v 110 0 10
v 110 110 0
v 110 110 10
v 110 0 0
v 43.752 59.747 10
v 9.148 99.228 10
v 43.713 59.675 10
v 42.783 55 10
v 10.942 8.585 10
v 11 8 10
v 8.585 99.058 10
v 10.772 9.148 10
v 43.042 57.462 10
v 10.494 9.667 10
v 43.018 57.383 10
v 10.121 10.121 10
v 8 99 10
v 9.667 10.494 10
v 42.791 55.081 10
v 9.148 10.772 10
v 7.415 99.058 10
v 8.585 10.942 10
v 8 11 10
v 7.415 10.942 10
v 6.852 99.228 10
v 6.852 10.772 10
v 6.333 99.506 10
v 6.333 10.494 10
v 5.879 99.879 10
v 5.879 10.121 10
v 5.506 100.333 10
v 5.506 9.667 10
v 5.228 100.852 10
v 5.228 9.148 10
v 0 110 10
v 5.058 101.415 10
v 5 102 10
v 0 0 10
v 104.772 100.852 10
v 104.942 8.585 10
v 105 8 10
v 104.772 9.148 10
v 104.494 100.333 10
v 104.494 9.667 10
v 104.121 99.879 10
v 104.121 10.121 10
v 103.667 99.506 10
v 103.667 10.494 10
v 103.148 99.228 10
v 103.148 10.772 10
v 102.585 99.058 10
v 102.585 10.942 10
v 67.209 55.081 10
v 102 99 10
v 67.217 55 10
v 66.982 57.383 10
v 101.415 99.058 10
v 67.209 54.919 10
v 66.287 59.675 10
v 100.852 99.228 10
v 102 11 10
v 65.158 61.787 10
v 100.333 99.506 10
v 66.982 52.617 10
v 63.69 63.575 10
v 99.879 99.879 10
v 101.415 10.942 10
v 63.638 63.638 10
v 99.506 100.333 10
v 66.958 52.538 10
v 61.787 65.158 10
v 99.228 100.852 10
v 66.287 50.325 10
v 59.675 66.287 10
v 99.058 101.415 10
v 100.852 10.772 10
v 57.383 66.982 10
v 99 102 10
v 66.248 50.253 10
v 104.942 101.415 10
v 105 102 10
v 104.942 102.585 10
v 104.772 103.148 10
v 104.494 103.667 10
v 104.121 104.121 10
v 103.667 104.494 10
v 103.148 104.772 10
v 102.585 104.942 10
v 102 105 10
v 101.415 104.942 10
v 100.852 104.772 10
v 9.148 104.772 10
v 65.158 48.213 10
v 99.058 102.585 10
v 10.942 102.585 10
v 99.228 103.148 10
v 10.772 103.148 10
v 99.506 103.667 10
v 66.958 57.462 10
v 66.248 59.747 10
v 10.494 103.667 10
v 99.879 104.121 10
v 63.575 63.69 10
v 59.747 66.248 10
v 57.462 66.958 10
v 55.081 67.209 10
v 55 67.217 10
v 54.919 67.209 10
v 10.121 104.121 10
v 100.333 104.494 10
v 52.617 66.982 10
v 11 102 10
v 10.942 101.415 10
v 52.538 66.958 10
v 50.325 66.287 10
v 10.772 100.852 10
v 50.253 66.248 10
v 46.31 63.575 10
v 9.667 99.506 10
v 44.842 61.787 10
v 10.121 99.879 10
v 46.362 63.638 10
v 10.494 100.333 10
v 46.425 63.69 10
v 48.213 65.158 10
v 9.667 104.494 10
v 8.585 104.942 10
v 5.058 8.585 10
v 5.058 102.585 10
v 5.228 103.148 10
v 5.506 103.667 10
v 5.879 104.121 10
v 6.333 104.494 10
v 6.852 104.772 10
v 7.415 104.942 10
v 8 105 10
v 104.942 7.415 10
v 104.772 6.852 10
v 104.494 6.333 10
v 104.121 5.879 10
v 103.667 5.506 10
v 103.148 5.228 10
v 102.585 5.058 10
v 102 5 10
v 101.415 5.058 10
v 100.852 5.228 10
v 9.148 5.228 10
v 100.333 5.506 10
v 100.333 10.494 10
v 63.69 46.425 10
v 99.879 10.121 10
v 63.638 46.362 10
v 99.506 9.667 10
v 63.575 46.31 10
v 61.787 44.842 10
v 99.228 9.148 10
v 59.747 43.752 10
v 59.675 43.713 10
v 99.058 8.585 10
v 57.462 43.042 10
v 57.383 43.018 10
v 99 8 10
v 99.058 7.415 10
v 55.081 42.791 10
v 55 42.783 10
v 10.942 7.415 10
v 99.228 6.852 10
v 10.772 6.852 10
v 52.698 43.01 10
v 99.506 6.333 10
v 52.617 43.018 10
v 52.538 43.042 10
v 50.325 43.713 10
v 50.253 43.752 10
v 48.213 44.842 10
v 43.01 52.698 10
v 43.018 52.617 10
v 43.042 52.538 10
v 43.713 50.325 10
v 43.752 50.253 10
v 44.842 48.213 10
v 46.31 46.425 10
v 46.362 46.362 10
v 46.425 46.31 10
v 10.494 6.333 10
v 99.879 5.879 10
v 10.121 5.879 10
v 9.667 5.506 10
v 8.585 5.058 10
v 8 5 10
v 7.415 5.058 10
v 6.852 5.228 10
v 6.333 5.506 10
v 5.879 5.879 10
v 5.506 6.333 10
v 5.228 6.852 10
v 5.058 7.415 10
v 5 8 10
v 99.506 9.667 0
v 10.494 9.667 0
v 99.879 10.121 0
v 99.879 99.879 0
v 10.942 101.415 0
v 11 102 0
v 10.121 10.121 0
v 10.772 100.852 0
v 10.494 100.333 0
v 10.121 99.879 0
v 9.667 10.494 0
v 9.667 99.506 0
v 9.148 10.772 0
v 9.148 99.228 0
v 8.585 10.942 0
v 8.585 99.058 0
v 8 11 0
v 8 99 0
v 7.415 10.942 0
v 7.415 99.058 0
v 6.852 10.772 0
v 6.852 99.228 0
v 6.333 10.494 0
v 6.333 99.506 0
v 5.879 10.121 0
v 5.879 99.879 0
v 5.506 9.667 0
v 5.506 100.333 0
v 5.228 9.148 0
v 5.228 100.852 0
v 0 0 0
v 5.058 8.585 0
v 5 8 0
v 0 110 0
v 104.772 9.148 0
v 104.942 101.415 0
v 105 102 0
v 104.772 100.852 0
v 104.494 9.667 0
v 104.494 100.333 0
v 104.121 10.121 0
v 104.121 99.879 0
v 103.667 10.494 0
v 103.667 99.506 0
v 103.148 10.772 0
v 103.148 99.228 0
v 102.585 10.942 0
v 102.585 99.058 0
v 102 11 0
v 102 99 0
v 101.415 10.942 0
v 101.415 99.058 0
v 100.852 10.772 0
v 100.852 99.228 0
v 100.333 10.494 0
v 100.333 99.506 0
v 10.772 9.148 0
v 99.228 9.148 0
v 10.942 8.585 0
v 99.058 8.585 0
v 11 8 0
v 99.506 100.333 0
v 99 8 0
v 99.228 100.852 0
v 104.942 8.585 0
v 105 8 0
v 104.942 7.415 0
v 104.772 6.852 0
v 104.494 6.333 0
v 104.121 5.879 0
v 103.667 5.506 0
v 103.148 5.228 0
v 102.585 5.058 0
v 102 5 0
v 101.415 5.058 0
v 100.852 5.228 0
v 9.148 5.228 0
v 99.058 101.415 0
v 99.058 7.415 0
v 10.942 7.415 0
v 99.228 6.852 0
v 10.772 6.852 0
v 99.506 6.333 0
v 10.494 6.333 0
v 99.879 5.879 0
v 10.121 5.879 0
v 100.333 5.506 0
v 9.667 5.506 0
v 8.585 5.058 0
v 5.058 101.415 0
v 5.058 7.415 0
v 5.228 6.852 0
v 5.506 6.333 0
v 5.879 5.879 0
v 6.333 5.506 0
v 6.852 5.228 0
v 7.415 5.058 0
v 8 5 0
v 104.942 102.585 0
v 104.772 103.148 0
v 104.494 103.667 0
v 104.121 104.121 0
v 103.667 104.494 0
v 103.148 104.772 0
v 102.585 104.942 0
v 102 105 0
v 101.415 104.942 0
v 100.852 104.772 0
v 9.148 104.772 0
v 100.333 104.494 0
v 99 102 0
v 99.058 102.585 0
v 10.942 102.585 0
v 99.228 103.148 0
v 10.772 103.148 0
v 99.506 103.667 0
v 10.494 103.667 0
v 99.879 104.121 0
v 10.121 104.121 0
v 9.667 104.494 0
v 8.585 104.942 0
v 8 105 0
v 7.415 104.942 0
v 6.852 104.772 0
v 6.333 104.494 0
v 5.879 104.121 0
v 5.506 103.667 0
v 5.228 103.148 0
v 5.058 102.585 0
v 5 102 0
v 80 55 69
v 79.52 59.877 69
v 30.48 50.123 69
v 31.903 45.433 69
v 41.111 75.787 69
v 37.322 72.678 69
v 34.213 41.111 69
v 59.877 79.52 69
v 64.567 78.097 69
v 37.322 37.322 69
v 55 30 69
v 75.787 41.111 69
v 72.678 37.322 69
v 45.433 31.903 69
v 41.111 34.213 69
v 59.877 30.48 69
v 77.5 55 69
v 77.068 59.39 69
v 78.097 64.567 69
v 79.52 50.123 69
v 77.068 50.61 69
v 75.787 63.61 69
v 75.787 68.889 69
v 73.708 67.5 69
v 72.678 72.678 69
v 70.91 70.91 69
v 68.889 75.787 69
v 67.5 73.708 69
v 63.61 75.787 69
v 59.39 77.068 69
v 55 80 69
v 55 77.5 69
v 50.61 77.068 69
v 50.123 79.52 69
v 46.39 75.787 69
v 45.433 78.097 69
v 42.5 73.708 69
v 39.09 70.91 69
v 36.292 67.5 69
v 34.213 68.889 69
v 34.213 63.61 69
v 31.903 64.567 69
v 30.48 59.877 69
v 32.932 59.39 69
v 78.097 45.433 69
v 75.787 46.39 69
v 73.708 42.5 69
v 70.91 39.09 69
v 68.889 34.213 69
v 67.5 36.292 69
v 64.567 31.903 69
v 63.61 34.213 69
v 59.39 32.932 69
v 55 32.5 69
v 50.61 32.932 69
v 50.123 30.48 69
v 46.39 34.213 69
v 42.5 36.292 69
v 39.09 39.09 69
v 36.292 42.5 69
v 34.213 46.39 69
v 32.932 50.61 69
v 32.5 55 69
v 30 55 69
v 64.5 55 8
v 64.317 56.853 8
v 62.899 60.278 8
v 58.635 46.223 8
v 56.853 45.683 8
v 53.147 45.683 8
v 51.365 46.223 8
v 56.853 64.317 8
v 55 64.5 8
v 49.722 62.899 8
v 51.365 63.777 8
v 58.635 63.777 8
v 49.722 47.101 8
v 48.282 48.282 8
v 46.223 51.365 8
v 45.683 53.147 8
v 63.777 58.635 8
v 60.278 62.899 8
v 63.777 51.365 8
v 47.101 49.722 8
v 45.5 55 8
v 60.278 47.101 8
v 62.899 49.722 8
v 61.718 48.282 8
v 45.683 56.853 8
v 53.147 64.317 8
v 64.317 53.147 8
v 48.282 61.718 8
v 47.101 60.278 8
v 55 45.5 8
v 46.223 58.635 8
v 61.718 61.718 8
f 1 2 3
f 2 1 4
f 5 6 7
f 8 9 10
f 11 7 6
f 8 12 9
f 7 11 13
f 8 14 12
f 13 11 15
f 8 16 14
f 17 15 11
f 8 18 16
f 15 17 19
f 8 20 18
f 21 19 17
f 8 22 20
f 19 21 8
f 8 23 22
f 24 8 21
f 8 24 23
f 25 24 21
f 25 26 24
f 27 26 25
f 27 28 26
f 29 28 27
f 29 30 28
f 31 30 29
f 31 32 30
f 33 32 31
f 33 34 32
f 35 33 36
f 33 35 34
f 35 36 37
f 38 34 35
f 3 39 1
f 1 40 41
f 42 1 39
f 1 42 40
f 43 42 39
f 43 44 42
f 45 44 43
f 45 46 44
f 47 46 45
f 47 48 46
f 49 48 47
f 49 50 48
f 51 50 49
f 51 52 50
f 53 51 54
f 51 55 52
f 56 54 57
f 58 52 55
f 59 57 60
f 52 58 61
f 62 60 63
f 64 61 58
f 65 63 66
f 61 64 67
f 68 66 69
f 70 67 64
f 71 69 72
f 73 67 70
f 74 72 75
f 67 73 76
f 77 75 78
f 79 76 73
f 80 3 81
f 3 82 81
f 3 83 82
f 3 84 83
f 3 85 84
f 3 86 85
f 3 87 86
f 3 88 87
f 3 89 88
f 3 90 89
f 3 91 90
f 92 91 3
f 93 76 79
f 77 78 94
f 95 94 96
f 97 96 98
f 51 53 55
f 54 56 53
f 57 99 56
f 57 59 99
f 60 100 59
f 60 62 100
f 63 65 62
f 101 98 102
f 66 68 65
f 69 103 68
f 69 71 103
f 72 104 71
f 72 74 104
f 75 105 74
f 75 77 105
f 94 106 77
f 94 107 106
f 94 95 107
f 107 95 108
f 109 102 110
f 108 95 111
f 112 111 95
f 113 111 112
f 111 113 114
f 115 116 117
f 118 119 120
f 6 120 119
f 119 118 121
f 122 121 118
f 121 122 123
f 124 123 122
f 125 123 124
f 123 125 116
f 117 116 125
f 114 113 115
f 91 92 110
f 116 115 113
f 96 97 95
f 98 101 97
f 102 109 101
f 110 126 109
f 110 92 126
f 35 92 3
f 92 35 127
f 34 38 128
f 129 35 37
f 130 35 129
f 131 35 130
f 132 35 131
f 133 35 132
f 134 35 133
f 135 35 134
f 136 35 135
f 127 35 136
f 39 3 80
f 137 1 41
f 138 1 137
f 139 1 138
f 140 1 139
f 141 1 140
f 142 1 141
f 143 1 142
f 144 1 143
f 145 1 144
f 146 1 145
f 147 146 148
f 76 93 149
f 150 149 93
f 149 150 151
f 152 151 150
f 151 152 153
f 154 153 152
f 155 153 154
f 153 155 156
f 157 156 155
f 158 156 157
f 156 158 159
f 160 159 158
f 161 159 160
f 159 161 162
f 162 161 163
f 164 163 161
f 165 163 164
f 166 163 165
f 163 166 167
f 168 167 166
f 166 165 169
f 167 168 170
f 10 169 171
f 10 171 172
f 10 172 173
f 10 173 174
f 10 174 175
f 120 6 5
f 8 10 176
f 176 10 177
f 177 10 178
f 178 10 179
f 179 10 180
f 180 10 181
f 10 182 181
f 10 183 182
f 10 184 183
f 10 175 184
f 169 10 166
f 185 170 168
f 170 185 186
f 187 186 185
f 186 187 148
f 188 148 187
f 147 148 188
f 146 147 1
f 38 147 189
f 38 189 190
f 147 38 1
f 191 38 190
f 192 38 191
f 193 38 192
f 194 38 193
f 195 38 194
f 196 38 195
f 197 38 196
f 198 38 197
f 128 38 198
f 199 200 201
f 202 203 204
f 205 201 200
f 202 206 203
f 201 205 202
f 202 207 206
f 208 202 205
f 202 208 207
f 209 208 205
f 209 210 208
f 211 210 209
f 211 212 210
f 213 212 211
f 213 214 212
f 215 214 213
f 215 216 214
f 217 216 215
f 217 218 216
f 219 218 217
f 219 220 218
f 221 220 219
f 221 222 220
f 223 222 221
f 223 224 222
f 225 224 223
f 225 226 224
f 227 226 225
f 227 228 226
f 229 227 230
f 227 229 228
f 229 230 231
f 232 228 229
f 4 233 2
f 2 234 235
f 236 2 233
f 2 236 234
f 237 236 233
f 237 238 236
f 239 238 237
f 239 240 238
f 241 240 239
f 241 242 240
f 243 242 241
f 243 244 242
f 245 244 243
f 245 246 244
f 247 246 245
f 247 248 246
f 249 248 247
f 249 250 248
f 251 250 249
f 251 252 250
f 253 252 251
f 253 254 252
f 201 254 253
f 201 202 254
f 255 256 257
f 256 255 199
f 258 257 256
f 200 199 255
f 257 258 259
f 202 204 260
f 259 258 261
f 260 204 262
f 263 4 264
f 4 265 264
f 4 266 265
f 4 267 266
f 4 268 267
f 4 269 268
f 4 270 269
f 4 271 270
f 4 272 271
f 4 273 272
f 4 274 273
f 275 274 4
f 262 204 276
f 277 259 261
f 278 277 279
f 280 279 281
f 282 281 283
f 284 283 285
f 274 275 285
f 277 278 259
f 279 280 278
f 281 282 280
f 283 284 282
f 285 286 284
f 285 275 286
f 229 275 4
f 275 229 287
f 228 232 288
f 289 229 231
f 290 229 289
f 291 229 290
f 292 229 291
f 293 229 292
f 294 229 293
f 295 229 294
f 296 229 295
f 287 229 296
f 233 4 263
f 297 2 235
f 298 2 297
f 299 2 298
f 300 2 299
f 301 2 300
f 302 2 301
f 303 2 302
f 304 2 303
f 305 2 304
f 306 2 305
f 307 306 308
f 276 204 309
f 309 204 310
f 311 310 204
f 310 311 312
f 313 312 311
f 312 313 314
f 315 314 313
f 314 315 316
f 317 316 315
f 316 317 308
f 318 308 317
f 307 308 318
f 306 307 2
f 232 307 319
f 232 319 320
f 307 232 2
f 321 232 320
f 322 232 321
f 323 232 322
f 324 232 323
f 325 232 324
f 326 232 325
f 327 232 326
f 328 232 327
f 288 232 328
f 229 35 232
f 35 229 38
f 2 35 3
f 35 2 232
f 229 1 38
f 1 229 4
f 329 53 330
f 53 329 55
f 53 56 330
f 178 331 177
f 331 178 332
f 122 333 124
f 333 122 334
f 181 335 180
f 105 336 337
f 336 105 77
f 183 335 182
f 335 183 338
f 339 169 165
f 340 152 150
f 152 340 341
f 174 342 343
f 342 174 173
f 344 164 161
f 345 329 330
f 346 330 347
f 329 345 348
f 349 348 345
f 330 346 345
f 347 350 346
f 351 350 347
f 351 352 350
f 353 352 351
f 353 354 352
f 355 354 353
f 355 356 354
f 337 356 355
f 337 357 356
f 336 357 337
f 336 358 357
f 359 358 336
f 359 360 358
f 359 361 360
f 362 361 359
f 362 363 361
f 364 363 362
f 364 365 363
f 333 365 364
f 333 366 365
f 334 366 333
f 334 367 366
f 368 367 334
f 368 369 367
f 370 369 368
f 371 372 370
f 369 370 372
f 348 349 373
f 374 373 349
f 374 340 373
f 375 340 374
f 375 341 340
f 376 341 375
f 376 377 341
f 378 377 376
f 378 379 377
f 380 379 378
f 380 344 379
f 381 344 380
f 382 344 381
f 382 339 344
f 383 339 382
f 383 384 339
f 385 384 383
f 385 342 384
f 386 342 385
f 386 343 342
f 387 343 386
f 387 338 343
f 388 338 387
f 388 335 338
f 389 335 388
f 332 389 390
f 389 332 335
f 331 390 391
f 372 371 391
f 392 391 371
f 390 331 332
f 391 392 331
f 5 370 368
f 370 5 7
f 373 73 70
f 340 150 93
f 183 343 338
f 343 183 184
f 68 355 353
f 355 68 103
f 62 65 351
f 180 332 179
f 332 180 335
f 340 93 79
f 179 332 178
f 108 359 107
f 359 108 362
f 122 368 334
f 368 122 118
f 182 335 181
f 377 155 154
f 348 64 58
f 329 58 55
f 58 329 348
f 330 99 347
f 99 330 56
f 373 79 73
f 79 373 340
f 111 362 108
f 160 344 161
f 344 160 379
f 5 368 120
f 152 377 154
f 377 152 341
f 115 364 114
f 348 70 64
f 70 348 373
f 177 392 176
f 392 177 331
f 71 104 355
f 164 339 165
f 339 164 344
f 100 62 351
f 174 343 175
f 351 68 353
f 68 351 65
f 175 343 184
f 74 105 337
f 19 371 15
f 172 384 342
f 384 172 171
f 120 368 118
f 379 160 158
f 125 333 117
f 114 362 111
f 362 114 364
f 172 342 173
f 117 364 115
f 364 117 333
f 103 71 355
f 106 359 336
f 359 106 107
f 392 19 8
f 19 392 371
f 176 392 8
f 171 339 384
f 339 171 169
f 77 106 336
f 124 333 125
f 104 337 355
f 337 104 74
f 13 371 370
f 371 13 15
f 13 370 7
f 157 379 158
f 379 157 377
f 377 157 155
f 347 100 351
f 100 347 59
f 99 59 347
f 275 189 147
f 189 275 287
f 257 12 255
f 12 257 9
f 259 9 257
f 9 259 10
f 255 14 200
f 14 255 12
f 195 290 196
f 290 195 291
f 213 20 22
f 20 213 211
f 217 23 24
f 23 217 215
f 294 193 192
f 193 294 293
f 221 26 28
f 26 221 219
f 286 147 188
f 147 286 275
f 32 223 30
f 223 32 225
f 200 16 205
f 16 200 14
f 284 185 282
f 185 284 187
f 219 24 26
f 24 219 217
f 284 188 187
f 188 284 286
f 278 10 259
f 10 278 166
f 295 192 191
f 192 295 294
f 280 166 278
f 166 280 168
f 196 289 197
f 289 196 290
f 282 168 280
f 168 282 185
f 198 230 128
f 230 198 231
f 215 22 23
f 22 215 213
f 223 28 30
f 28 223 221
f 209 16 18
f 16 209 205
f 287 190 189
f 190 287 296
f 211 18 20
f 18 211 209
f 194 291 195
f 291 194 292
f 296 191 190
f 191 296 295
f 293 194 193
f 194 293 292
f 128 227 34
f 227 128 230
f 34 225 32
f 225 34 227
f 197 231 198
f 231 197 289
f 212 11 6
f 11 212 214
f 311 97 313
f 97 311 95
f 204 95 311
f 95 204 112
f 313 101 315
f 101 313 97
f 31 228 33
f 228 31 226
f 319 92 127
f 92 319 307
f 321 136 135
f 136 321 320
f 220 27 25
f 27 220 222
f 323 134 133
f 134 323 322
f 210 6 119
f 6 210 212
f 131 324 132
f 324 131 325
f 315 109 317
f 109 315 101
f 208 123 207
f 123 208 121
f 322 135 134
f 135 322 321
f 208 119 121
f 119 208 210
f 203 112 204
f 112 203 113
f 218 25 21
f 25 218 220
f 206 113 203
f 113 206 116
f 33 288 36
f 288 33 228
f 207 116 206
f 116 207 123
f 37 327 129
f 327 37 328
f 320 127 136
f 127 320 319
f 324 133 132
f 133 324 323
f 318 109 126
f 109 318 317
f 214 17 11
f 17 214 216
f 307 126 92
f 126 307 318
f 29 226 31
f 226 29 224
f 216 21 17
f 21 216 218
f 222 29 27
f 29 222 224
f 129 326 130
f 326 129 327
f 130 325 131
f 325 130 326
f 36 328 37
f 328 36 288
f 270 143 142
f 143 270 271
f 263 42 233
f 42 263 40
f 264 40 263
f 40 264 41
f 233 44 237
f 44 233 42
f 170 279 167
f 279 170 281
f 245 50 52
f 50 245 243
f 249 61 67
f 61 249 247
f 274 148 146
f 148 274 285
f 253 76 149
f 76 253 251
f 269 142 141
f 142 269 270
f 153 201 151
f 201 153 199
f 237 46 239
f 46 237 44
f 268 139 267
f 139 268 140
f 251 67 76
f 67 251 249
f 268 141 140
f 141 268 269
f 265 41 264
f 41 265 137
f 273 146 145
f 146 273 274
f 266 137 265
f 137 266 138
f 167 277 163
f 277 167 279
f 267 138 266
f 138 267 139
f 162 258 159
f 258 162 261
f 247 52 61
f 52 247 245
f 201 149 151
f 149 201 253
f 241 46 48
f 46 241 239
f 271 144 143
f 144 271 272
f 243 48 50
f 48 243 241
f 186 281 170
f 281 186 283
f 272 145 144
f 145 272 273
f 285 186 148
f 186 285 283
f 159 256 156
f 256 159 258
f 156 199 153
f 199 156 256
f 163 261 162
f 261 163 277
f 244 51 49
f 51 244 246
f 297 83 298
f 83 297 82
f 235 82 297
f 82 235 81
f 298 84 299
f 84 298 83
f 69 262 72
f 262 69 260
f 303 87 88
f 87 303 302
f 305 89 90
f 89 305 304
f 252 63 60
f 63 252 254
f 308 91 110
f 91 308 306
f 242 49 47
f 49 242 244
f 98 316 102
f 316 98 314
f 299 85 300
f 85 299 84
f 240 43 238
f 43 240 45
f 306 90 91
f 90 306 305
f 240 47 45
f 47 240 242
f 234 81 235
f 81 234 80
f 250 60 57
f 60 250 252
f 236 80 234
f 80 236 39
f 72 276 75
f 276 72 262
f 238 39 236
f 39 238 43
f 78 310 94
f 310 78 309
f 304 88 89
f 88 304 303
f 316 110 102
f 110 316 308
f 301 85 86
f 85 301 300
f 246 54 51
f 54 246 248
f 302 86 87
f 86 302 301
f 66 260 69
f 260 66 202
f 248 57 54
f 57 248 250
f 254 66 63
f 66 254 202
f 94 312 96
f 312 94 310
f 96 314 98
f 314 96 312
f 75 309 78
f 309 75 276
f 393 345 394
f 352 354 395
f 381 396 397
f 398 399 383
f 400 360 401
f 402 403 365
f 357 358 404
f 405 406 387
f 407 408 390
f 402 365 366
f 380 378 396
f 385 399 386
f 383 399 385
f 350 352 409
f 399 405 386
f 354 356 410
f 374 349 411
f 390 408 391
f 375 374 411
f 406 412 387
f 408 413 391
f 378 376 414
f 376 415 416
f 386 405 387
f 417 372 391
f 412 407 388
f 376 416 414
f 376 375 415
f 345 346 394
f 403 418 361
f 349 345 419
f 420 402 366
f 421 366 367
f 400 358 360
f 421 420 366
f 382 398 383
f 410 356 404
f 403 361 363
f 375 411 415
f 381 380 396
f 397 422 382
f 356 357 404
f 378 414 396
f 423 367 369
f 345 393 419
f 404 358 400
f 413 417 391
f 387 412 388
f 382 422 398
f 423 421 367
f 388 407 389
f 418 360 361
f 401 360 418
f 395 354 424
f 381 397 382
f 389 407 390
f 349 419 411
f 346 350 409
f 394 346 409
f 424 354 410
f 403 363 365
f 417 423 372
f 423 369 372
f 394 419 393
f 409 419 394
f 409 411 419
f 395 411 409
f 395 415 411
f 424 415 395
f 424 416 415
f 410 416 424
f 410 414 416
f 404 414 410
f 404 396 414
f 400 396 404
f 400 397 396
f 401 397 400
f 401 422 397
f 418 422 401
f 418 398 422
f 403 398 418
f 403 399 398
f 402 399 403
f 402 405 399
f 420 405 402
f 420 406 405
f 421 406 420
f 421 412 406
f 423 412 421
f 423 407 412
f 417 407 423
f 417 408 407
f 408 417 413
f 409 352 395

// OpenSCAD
$fn = 32;

// ----------------------------------------------------------------------
// Hopper: flanged with square flange
// ----------------------------------------------------------------------

// --- parameters (mm) ---
fl = 110;                 // flange side, X and Y
fl_t = 10;                // flange thickness
cone_h = 60;              // cone height above the flange
top_d = 50;               // cone mouth diameter
bot_d = 24;               // cone spout diameter
wall = 2.5;               // cone wall thickness
hole_r = 3;               // flange hole radius
hole_in = 8;              // hole inset from the corners

bore_d = bot_d - 2 * wall;  // spout bore diameter
total_h = fl_t + cone_h - 1;  // overall height

difference() {
  union() {
    cube([fl, fl, fl_t]);
    translate([fl / 2, fl / 2, fl_t - 1])
      cylinder(h = cone_h, d1 = bot_d, d2 = top_d);
  }
  translate([fl / 2, fl / 2, fl_t - 2])
    cylinder(h = cone_h + 1, d1 = bore_d, d2 = top_d - 2 * wall);
  for (sx = [0, 1], sy = [0, 1])
    translate([sx ? fl - hole_in : hole_in,
               sy ? fl - hole_in : hole_in, -1])
      cylinder(r = hole_r, h = fl_t + 2);
}
